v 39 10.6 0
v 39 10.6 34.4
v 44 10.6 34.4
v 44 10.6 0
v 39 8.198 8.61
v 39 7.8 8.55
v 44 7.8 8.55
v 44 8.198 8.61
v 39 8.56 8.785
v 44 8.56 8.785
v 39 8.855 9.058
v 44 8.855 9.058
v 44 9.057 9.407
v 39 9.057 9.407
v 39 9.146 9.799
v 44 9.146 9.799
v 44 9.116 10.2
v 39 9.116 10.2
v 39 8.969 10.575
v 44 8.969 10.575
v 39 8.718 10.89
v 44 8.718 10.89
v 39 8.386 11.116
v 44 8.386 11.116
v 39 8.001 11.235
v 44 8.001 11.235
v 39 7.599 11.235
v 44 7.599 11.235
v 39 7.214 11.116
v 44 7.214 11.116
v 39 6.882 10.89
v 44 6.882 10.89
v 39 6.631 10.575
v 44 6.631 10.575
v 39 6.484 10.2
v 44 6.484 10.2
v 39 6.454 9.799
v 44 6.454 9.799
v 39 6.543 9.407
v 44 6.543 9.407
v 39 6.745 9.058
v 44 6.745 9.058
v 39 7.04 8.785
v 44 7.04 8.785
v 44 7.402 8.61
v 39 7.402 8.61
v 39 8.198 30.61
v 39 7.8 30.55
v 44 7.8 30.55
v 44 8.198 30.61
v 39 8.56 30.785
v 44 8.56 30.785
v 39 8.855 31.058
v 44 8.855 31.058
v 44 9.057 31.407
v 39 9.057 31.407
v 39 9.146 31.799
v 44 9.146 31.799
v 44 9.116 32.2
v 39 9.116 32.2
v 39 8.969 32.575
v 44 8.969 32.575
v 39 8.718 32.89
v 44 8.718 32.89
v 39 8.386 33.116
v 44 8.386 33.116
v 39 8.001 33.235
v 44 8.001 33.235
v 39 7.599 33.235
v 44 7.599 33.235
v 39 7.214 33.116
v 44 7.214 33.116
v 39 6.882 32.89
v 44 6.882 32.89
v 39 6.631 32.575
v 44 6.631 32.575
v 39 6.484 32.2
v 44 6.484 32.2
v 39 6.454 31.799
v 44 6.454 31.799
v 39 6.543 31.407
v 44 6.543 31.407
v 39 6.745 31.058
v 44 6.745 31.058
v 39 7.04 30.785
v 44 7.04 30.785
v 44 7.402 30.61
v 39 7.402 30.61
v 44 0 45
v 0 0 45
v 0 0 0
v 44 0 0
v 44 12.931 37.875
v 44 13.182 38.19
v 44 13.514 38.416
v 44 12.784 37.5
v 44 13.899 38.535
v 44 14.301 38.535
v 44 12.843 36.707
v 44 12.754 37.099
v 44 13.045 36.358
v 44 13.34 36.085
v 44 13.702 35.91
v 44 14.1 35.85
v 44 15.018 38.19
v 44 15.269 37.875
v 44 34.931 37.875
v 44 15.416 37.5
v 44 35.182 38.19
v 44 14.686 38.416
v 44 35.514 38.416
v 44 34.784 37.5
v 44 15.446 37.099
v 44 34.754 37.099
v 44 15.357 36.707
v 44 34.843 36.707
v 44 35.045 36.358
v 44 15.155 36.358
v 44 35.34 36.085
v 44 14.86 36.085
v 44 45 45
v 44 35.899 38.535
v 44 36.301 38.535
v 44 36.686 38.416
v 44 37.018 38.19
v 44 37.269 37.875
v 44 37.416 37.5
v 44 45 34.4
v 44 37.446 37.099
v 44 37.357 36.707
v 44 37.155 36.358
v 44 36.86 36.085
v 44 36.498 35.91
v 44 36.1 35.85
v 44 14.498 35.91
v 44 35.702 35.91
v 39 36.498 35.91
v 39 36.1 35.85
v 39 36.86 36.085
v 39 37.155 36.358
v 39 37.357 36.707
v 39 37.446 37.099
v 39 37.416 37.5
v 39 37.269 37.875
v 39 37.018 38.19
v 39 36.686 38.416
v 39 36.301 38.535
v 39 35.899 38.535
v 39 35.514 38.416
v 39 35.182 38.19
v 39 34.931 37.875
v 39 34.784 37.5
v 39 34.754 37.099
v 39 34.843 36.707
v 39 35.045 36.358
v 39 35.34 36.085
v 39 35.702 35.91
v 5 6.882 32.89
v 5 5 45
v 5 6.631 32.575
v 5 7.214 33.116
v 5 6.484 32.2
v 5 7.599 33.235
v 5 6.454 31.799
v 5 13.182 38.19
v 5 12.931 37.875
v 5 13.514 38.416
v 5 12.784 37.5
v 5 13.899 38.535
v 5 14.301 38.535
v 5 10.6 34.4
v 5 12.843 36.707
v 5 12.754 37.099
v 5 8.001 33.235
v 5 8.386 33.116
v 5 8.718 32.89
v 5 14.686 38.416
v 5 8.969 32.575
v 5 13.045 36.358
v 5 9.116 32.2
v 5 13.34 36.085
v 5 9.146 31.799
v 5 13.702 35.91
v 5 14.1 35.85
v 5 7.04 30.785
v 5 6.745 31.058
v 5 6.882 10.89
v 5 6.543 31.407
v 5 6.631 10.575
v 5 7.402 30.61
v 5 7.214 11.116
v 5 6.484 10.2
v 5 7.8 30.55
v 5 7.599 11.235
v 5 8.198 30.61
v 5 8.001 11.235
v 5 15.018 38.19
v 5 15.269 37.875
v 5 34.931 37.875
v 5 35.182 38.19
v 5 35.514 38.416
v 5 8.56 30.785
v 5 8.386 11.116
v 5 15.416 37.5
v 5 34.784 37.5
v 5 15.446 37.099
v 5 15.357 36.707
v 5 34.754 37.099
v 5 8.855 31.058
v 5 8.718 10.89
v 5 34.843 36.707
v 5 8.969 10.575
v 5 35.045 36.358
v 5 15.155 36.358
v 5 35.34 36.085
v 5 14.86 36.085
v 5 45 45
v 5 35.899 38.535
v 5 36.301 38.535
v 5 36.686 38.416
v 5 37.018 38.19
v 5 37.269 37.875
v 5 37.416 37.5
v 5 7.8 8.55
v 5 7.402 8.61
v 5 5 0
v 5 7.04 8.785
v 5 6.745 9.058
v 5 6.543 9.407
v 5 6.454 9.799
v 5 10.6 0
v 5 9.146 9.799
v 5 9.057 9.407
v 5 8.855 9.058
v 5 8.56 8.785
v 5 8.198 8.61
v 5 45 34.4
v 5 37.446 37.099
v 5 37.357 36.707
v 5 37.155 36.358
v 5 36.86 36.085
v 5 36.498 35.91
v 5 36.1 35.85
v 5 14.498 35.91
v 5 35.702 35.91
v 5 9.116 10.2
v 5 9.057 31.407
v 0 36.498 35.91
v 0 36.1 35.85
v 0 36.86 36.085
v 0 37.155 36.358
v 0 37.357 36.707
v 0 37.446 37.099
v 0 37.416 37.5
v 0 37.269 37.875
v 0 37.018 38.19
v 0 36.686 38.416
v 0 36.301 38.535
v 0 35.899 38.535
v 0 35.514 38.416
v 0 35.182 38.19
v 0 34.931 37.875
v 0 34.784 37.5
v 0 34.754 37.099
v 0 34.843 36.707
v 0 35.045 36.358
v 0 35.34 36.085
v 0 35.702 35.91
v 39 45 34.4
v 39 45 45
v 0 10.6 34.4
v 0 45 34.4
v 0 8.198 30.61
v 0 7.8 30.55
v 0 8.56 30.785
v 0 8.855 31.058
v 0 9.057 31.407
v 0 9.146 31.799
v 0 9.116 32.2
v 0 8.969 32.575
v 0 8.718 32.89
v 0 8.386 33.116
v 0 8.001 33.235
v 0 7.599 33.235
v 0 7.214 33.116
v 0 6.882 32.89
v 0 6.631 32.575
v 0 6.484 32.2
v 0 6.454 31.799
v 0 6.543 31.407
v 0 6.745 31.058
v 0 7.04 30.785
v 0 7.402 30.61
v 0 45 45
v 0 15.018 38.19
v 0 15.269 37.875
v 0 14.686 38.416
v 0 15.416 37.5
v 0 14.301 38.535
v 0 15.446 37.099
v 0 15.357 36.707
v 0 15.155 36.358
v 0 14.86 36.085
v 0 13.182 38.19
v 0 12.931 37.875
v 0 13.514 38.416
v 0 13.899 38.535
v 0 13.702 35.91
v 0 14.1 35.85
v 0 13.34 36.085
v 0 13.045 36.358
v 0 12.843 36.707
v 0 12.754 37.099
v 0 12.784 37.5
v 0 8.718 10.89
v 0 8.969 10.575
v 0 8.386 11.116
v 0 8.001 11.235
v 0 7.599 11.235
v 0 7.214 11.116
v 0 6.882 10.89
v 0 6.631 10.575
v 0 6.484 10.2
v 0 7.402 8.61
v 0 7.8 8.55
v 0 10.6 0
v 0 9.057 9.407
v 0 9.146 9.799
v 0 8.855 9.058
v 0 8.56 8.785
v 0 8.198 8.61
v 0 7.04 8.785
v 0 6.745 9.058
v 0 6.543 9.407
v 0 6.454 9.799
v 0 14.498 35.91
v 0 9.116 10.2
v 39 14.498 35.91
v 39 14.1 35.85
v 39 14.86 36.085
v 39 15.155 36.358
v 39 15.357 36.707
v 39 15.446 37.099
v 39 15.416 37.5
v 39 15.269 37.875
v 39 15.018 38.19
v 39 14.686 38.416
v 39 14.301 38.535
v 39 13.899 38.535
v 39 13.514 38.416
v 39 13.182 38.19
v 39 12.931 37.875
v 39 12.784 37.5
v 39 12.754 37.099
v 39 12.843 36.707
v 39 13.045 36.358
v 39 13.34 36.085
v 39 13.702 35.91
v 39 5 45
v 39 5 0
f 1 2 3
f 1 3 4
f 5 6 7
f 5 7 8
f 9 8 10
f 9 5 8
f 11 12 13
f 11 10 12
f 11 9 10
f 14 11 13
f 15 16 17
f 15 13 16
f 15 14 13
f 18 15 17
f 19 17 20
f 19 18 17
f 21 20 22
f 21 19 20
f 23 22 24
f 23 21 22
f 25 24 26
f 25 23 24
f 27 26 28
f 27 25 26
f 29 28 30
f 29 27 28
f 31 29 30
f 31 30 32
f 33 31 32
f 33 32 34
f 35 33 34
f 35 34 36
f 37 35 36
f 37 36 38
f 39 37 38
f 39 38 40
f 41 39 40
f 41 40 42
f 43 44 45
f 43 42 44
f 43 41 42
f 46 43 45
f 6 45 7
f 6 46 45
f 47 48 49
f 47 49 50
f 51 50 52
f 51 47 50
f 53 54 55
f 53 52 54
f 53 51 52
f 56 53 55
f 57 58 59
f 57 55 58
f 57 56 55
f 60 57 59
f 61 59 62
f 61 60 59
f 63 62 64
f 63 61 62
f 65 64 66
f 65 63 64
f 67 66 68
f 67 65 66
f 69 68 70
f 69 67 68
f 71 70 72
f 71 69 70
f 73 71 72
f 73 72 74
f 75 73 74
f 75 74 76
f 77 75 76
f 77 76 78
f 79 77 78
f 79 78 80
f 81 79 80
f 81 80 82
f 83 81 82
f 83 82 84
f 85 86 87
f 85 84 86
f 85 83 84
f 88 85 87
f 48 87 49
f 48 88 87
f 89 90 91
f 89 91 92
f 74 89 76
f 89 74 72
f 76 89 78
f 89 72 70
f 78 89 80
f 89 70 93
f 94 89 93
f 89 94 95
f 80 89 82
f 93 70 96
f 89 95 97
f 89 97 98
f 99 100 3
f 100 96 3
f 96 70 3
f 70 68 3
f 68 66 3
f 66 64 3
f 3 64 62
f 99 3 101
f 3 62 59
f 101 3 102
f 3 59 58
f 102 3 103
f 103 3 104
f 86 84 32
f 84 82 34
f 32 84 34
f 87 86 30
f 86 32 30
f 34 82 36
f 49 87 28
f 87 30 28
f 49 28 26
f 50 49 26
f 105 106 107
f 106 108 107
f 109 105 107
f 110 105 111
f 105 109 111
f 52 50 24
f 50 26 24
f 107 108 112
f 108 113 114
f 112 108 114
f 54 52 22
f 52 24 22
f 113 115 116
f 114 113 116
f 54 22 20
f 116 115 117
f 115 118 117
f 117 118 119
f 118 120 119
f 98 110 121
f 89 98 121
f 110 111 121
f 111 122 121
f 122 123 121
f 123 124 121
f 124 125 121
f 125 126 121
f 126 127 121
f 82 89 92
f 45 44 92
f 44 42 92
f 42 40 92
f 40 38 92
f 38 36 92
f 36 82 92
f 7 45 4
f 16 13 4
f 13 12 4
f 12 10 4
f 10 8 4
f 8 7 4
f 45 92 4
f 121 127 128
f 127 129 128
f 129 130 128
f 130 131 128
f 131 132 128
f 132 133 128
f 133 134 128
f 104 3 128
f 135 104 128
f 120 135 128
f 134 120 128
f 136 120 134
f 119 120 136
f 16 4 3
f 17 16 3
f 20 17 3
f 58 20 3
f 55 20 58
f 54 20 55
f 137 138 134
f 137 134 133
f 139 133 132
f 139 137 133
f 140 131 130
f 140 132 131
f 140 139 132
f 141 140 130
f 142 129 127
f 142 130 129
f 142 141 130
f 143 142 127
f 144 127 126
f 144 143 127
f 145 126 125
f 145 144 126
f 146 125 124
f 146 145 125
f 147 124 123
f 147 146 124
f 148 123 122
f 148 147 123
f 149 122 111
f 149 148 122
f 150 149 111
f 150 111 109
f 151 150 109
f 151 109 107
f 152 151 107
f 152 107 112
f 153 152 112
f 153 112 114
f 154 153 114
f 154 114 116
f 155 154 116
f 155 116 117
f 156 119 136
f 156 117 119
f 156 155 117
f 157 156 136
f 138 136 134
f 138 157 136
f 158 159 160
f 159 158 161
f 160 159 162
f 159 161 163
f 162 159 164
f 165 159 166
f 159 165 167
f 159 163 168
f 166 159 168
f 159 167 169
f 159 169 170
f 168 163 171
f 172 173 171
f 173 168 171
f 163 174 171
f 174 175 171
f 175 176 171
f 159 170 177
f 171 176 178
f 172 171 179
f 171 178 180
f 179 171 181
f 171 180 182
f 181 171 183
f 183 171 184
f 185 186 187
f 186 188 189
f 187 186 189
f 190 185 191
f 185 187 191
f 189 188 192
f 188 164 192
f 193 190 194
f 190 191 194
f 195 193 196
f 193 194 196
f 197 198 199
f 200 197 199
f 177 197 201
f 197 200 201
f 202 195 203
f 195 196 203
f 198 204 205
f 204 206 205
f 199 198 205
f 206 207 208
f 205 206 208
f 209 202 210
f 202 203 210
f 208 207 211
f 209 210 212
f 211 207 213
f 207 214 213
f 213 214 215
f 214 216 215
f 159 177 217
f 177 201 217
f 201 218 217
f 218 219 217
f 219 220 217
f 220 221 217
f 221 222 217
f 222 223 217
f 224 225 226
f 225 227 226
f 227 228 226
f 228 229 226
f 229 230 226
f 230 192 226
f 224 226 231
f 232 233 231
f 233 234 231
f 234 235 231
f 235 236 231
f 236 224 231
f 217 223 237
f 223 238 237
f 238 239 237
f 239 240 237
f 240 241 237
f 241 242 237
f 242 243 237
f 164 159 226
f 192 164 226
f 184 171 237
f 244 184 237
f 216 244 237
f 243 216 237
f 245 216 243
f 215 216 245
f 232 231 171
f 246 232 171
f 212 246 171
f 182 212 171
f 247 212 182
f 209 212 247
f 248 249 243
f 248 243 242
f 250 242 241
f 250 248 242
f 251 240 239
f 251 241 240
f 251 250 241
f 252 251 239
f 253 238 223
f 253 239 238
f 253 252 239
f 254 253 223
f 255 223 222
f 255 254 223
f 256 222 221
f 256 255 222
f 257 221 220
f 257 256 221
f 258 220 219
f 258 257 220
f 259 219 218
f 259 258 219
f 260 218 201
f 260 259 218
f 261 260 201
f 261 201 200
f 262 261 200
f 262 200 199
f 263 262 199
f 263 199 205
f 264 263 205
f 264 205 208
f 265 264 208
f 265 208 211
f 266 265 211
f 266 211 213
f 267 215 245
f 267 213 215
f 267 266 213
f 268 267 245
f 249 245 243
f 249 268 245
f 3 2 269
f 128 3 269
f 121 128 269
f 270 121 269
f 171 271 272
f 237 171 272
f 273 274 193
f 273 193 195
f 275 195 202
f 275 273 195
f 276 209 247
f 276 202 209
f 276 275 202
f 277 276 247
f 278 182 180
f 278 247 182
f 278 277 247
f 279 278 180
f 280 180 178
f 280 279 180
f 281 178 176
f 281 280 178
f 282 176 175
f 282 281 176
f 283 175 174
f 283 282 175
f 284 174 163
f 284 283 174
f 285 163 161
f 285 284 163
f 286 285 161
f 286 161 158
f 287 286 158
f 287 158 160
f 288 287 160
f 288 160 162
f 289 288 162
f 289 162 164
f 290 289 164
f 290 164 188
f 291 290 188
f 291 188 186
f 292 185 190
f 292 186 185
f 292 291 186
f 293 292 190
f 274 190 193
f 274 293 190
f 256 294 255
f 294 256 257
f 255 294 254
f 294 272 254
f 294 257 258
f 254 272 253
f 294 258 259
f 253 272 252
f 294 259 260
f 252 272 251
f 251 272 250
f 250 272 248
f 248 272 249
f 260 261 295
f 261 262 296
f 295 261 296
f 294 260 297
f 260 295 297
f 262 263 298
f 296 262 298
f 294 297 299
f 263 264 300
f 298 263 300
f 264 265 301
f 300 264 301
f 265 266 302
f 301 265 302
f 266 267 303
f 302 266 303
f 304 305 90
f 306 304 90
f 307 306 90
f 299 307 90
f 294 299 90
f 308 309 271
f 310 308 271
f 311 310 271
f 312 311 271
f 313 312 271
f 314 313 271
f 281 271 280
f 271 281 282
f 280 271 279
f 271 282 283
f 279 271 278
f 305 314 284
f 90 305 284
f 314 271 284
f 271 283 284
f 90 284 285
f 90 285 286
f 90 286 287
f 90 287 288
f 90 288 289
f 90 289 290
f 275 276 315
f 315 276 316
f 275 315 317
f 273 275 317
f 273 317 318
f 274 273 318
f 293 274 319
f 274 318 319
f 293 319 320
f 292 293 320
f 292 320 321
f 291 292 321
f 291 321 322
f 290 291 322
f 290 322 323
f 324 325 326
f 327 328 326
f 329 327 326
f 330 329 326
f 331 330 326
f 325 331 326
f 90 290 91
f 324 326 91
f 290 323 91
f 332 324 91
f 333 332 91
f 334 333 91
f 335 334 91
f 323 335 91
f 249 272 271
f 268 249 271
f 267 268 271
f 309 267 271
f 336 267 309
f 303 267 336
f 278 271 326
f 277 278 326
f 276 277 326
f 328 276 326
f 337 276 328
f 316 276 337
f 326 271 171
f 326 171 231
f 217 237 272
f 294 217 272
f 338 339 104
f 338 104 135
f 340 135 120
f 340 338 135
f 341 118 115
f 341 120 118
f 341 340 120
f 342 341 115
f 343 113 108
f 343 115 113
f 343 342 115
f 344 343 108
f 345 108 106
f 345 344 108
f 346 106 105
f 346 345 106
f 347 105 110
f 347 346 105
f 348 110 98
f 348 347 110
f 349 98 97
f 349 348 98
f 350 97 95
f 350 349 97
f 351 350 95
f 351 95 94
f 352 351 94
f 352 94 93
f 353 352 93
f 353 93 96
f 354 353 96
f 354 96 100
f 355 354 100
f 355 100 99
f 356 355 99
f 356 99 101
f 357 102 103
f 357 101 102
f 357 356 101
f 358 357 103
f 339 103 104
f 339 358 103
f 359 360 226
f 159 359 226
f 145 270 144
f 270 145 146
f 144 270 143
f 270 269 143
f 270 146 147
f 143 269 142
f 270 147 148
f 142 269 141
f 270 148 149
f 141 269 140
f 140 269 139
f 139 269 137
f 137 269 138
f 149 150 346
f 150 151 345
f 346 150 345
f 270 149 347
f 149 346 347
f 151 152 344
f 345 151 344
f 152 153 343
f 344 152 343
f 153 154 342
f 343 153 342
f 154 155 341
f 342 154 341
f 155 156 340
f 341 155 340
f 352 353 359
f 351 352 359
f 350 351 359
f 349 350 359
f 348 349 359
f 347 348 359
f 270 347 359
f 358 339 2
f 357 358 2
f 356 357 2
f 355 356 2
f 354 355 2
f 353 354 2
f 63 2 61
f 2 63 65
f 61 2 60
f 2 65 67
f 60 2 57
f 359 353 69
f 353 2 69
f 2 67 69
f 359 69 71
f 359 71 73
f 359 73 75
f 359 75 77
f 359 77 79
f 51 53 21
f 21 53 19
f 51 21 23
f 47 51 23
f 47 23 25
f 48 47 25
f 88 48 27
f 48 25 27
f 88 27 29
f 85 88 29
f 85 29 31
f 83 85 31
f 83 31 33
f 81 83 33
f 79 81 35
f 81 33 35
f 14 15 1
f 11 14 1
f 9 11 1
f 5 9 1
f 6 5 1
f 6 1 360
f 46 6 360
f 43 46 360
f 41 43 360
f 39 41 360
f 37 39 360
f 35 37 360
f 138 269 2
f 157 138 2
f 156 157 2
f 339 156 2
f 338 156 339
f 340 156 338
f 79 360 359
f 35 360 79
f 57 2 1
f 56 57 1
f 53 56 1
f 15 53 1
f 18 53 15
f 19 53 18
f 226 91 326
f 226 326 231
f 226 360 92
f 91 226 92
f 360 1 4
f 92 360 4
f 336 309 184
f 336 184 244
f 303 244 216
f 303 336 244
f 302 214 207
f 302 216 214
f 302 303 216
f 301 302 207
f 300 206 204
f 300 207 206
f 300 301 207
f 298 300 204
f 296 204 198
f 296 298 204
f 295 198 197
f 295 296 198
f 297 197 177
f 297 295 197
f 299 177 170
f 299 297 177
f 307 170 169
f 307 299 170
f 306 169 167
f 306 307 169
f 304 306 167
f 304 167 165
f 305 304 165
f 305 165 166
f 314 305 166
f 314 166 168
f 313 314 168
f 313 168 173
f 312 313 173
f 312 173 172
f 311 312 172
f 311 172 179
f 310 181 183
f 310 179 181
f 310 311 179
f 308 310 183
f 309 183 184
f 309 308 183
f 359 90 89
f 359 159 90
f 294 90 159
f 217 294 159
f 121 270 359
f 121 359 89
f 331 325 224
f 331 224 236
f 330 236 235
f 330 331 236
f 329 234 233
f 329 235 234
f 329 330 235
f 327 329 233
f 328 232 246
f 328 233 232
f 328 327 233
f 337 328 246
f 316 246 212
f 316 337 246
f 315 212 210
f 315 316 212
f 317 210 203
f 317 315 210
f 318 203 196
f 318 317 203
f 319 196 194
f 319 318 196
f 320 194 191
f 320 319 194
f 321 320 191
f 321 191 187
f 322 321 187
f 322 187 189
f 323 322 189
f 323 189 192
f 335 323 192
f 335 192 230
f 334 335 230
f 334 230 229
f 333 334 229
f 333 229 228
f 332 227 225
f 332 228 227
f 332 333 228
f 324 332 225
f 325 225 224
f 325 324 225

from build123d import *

# Parameters (mm, degrees)
BOSS_EXTRUDE1_DEPTH     = 45
CUT_EXTRUDE1_DEPTH      = 75.639131828
CUT_EXTRUDE1_DEPTH_BACK = 75.639131828
SKETCH3_R               = 1.35
SKETCH3_W               = 34.4
SKETCH3_H               = 34.4


with BuildPart() as part:
    # Sketch1 → Boss-Extrude1 (new body)
    with BuildSketch(Plane.XY):
        Polygon((0, 0), (44, 0), (44, 45), (39, 45), (39, 5), (5, 5), (5, 45), (0, 45), align=None)
    extrude(amount=BOSS_EXTRUDE1_DEPTH)

    # Sketch3 → Cut-Extrude1 (cut, two sides: drawn at the far end of the back side and taken through both)
    with BuildSketch(Plane(origin=(5, 0, 0), x_dir=(0, 0, -1), z_dir=(1, 0, 0)).offset(-CUT_EXTRUDE1_DEPTH_BACK)):
        with Locations((-37.2, 36.1)):
            Circle(SKETCH3_R)
        with Locations((-37.2, 14.1)):
            Circle(SKETCH3_R)
        with Locations((-31.9, 7.8)):
            Circle(SKETCH3_R)
        with Locations((-9.9, 7.8)):
            Circle(SKETCH3_R)
        with Locations((-17.2, 27.8)):
            Rectangle(SKETCH3_W, SKETCH3_H)
    extrude(amount=CUT_EXTRUDE1_DEPTH + CUT_EXTRUDE1_DEPTH_BACK, mode=Mode.SUBTRACT)


solid = part.part
